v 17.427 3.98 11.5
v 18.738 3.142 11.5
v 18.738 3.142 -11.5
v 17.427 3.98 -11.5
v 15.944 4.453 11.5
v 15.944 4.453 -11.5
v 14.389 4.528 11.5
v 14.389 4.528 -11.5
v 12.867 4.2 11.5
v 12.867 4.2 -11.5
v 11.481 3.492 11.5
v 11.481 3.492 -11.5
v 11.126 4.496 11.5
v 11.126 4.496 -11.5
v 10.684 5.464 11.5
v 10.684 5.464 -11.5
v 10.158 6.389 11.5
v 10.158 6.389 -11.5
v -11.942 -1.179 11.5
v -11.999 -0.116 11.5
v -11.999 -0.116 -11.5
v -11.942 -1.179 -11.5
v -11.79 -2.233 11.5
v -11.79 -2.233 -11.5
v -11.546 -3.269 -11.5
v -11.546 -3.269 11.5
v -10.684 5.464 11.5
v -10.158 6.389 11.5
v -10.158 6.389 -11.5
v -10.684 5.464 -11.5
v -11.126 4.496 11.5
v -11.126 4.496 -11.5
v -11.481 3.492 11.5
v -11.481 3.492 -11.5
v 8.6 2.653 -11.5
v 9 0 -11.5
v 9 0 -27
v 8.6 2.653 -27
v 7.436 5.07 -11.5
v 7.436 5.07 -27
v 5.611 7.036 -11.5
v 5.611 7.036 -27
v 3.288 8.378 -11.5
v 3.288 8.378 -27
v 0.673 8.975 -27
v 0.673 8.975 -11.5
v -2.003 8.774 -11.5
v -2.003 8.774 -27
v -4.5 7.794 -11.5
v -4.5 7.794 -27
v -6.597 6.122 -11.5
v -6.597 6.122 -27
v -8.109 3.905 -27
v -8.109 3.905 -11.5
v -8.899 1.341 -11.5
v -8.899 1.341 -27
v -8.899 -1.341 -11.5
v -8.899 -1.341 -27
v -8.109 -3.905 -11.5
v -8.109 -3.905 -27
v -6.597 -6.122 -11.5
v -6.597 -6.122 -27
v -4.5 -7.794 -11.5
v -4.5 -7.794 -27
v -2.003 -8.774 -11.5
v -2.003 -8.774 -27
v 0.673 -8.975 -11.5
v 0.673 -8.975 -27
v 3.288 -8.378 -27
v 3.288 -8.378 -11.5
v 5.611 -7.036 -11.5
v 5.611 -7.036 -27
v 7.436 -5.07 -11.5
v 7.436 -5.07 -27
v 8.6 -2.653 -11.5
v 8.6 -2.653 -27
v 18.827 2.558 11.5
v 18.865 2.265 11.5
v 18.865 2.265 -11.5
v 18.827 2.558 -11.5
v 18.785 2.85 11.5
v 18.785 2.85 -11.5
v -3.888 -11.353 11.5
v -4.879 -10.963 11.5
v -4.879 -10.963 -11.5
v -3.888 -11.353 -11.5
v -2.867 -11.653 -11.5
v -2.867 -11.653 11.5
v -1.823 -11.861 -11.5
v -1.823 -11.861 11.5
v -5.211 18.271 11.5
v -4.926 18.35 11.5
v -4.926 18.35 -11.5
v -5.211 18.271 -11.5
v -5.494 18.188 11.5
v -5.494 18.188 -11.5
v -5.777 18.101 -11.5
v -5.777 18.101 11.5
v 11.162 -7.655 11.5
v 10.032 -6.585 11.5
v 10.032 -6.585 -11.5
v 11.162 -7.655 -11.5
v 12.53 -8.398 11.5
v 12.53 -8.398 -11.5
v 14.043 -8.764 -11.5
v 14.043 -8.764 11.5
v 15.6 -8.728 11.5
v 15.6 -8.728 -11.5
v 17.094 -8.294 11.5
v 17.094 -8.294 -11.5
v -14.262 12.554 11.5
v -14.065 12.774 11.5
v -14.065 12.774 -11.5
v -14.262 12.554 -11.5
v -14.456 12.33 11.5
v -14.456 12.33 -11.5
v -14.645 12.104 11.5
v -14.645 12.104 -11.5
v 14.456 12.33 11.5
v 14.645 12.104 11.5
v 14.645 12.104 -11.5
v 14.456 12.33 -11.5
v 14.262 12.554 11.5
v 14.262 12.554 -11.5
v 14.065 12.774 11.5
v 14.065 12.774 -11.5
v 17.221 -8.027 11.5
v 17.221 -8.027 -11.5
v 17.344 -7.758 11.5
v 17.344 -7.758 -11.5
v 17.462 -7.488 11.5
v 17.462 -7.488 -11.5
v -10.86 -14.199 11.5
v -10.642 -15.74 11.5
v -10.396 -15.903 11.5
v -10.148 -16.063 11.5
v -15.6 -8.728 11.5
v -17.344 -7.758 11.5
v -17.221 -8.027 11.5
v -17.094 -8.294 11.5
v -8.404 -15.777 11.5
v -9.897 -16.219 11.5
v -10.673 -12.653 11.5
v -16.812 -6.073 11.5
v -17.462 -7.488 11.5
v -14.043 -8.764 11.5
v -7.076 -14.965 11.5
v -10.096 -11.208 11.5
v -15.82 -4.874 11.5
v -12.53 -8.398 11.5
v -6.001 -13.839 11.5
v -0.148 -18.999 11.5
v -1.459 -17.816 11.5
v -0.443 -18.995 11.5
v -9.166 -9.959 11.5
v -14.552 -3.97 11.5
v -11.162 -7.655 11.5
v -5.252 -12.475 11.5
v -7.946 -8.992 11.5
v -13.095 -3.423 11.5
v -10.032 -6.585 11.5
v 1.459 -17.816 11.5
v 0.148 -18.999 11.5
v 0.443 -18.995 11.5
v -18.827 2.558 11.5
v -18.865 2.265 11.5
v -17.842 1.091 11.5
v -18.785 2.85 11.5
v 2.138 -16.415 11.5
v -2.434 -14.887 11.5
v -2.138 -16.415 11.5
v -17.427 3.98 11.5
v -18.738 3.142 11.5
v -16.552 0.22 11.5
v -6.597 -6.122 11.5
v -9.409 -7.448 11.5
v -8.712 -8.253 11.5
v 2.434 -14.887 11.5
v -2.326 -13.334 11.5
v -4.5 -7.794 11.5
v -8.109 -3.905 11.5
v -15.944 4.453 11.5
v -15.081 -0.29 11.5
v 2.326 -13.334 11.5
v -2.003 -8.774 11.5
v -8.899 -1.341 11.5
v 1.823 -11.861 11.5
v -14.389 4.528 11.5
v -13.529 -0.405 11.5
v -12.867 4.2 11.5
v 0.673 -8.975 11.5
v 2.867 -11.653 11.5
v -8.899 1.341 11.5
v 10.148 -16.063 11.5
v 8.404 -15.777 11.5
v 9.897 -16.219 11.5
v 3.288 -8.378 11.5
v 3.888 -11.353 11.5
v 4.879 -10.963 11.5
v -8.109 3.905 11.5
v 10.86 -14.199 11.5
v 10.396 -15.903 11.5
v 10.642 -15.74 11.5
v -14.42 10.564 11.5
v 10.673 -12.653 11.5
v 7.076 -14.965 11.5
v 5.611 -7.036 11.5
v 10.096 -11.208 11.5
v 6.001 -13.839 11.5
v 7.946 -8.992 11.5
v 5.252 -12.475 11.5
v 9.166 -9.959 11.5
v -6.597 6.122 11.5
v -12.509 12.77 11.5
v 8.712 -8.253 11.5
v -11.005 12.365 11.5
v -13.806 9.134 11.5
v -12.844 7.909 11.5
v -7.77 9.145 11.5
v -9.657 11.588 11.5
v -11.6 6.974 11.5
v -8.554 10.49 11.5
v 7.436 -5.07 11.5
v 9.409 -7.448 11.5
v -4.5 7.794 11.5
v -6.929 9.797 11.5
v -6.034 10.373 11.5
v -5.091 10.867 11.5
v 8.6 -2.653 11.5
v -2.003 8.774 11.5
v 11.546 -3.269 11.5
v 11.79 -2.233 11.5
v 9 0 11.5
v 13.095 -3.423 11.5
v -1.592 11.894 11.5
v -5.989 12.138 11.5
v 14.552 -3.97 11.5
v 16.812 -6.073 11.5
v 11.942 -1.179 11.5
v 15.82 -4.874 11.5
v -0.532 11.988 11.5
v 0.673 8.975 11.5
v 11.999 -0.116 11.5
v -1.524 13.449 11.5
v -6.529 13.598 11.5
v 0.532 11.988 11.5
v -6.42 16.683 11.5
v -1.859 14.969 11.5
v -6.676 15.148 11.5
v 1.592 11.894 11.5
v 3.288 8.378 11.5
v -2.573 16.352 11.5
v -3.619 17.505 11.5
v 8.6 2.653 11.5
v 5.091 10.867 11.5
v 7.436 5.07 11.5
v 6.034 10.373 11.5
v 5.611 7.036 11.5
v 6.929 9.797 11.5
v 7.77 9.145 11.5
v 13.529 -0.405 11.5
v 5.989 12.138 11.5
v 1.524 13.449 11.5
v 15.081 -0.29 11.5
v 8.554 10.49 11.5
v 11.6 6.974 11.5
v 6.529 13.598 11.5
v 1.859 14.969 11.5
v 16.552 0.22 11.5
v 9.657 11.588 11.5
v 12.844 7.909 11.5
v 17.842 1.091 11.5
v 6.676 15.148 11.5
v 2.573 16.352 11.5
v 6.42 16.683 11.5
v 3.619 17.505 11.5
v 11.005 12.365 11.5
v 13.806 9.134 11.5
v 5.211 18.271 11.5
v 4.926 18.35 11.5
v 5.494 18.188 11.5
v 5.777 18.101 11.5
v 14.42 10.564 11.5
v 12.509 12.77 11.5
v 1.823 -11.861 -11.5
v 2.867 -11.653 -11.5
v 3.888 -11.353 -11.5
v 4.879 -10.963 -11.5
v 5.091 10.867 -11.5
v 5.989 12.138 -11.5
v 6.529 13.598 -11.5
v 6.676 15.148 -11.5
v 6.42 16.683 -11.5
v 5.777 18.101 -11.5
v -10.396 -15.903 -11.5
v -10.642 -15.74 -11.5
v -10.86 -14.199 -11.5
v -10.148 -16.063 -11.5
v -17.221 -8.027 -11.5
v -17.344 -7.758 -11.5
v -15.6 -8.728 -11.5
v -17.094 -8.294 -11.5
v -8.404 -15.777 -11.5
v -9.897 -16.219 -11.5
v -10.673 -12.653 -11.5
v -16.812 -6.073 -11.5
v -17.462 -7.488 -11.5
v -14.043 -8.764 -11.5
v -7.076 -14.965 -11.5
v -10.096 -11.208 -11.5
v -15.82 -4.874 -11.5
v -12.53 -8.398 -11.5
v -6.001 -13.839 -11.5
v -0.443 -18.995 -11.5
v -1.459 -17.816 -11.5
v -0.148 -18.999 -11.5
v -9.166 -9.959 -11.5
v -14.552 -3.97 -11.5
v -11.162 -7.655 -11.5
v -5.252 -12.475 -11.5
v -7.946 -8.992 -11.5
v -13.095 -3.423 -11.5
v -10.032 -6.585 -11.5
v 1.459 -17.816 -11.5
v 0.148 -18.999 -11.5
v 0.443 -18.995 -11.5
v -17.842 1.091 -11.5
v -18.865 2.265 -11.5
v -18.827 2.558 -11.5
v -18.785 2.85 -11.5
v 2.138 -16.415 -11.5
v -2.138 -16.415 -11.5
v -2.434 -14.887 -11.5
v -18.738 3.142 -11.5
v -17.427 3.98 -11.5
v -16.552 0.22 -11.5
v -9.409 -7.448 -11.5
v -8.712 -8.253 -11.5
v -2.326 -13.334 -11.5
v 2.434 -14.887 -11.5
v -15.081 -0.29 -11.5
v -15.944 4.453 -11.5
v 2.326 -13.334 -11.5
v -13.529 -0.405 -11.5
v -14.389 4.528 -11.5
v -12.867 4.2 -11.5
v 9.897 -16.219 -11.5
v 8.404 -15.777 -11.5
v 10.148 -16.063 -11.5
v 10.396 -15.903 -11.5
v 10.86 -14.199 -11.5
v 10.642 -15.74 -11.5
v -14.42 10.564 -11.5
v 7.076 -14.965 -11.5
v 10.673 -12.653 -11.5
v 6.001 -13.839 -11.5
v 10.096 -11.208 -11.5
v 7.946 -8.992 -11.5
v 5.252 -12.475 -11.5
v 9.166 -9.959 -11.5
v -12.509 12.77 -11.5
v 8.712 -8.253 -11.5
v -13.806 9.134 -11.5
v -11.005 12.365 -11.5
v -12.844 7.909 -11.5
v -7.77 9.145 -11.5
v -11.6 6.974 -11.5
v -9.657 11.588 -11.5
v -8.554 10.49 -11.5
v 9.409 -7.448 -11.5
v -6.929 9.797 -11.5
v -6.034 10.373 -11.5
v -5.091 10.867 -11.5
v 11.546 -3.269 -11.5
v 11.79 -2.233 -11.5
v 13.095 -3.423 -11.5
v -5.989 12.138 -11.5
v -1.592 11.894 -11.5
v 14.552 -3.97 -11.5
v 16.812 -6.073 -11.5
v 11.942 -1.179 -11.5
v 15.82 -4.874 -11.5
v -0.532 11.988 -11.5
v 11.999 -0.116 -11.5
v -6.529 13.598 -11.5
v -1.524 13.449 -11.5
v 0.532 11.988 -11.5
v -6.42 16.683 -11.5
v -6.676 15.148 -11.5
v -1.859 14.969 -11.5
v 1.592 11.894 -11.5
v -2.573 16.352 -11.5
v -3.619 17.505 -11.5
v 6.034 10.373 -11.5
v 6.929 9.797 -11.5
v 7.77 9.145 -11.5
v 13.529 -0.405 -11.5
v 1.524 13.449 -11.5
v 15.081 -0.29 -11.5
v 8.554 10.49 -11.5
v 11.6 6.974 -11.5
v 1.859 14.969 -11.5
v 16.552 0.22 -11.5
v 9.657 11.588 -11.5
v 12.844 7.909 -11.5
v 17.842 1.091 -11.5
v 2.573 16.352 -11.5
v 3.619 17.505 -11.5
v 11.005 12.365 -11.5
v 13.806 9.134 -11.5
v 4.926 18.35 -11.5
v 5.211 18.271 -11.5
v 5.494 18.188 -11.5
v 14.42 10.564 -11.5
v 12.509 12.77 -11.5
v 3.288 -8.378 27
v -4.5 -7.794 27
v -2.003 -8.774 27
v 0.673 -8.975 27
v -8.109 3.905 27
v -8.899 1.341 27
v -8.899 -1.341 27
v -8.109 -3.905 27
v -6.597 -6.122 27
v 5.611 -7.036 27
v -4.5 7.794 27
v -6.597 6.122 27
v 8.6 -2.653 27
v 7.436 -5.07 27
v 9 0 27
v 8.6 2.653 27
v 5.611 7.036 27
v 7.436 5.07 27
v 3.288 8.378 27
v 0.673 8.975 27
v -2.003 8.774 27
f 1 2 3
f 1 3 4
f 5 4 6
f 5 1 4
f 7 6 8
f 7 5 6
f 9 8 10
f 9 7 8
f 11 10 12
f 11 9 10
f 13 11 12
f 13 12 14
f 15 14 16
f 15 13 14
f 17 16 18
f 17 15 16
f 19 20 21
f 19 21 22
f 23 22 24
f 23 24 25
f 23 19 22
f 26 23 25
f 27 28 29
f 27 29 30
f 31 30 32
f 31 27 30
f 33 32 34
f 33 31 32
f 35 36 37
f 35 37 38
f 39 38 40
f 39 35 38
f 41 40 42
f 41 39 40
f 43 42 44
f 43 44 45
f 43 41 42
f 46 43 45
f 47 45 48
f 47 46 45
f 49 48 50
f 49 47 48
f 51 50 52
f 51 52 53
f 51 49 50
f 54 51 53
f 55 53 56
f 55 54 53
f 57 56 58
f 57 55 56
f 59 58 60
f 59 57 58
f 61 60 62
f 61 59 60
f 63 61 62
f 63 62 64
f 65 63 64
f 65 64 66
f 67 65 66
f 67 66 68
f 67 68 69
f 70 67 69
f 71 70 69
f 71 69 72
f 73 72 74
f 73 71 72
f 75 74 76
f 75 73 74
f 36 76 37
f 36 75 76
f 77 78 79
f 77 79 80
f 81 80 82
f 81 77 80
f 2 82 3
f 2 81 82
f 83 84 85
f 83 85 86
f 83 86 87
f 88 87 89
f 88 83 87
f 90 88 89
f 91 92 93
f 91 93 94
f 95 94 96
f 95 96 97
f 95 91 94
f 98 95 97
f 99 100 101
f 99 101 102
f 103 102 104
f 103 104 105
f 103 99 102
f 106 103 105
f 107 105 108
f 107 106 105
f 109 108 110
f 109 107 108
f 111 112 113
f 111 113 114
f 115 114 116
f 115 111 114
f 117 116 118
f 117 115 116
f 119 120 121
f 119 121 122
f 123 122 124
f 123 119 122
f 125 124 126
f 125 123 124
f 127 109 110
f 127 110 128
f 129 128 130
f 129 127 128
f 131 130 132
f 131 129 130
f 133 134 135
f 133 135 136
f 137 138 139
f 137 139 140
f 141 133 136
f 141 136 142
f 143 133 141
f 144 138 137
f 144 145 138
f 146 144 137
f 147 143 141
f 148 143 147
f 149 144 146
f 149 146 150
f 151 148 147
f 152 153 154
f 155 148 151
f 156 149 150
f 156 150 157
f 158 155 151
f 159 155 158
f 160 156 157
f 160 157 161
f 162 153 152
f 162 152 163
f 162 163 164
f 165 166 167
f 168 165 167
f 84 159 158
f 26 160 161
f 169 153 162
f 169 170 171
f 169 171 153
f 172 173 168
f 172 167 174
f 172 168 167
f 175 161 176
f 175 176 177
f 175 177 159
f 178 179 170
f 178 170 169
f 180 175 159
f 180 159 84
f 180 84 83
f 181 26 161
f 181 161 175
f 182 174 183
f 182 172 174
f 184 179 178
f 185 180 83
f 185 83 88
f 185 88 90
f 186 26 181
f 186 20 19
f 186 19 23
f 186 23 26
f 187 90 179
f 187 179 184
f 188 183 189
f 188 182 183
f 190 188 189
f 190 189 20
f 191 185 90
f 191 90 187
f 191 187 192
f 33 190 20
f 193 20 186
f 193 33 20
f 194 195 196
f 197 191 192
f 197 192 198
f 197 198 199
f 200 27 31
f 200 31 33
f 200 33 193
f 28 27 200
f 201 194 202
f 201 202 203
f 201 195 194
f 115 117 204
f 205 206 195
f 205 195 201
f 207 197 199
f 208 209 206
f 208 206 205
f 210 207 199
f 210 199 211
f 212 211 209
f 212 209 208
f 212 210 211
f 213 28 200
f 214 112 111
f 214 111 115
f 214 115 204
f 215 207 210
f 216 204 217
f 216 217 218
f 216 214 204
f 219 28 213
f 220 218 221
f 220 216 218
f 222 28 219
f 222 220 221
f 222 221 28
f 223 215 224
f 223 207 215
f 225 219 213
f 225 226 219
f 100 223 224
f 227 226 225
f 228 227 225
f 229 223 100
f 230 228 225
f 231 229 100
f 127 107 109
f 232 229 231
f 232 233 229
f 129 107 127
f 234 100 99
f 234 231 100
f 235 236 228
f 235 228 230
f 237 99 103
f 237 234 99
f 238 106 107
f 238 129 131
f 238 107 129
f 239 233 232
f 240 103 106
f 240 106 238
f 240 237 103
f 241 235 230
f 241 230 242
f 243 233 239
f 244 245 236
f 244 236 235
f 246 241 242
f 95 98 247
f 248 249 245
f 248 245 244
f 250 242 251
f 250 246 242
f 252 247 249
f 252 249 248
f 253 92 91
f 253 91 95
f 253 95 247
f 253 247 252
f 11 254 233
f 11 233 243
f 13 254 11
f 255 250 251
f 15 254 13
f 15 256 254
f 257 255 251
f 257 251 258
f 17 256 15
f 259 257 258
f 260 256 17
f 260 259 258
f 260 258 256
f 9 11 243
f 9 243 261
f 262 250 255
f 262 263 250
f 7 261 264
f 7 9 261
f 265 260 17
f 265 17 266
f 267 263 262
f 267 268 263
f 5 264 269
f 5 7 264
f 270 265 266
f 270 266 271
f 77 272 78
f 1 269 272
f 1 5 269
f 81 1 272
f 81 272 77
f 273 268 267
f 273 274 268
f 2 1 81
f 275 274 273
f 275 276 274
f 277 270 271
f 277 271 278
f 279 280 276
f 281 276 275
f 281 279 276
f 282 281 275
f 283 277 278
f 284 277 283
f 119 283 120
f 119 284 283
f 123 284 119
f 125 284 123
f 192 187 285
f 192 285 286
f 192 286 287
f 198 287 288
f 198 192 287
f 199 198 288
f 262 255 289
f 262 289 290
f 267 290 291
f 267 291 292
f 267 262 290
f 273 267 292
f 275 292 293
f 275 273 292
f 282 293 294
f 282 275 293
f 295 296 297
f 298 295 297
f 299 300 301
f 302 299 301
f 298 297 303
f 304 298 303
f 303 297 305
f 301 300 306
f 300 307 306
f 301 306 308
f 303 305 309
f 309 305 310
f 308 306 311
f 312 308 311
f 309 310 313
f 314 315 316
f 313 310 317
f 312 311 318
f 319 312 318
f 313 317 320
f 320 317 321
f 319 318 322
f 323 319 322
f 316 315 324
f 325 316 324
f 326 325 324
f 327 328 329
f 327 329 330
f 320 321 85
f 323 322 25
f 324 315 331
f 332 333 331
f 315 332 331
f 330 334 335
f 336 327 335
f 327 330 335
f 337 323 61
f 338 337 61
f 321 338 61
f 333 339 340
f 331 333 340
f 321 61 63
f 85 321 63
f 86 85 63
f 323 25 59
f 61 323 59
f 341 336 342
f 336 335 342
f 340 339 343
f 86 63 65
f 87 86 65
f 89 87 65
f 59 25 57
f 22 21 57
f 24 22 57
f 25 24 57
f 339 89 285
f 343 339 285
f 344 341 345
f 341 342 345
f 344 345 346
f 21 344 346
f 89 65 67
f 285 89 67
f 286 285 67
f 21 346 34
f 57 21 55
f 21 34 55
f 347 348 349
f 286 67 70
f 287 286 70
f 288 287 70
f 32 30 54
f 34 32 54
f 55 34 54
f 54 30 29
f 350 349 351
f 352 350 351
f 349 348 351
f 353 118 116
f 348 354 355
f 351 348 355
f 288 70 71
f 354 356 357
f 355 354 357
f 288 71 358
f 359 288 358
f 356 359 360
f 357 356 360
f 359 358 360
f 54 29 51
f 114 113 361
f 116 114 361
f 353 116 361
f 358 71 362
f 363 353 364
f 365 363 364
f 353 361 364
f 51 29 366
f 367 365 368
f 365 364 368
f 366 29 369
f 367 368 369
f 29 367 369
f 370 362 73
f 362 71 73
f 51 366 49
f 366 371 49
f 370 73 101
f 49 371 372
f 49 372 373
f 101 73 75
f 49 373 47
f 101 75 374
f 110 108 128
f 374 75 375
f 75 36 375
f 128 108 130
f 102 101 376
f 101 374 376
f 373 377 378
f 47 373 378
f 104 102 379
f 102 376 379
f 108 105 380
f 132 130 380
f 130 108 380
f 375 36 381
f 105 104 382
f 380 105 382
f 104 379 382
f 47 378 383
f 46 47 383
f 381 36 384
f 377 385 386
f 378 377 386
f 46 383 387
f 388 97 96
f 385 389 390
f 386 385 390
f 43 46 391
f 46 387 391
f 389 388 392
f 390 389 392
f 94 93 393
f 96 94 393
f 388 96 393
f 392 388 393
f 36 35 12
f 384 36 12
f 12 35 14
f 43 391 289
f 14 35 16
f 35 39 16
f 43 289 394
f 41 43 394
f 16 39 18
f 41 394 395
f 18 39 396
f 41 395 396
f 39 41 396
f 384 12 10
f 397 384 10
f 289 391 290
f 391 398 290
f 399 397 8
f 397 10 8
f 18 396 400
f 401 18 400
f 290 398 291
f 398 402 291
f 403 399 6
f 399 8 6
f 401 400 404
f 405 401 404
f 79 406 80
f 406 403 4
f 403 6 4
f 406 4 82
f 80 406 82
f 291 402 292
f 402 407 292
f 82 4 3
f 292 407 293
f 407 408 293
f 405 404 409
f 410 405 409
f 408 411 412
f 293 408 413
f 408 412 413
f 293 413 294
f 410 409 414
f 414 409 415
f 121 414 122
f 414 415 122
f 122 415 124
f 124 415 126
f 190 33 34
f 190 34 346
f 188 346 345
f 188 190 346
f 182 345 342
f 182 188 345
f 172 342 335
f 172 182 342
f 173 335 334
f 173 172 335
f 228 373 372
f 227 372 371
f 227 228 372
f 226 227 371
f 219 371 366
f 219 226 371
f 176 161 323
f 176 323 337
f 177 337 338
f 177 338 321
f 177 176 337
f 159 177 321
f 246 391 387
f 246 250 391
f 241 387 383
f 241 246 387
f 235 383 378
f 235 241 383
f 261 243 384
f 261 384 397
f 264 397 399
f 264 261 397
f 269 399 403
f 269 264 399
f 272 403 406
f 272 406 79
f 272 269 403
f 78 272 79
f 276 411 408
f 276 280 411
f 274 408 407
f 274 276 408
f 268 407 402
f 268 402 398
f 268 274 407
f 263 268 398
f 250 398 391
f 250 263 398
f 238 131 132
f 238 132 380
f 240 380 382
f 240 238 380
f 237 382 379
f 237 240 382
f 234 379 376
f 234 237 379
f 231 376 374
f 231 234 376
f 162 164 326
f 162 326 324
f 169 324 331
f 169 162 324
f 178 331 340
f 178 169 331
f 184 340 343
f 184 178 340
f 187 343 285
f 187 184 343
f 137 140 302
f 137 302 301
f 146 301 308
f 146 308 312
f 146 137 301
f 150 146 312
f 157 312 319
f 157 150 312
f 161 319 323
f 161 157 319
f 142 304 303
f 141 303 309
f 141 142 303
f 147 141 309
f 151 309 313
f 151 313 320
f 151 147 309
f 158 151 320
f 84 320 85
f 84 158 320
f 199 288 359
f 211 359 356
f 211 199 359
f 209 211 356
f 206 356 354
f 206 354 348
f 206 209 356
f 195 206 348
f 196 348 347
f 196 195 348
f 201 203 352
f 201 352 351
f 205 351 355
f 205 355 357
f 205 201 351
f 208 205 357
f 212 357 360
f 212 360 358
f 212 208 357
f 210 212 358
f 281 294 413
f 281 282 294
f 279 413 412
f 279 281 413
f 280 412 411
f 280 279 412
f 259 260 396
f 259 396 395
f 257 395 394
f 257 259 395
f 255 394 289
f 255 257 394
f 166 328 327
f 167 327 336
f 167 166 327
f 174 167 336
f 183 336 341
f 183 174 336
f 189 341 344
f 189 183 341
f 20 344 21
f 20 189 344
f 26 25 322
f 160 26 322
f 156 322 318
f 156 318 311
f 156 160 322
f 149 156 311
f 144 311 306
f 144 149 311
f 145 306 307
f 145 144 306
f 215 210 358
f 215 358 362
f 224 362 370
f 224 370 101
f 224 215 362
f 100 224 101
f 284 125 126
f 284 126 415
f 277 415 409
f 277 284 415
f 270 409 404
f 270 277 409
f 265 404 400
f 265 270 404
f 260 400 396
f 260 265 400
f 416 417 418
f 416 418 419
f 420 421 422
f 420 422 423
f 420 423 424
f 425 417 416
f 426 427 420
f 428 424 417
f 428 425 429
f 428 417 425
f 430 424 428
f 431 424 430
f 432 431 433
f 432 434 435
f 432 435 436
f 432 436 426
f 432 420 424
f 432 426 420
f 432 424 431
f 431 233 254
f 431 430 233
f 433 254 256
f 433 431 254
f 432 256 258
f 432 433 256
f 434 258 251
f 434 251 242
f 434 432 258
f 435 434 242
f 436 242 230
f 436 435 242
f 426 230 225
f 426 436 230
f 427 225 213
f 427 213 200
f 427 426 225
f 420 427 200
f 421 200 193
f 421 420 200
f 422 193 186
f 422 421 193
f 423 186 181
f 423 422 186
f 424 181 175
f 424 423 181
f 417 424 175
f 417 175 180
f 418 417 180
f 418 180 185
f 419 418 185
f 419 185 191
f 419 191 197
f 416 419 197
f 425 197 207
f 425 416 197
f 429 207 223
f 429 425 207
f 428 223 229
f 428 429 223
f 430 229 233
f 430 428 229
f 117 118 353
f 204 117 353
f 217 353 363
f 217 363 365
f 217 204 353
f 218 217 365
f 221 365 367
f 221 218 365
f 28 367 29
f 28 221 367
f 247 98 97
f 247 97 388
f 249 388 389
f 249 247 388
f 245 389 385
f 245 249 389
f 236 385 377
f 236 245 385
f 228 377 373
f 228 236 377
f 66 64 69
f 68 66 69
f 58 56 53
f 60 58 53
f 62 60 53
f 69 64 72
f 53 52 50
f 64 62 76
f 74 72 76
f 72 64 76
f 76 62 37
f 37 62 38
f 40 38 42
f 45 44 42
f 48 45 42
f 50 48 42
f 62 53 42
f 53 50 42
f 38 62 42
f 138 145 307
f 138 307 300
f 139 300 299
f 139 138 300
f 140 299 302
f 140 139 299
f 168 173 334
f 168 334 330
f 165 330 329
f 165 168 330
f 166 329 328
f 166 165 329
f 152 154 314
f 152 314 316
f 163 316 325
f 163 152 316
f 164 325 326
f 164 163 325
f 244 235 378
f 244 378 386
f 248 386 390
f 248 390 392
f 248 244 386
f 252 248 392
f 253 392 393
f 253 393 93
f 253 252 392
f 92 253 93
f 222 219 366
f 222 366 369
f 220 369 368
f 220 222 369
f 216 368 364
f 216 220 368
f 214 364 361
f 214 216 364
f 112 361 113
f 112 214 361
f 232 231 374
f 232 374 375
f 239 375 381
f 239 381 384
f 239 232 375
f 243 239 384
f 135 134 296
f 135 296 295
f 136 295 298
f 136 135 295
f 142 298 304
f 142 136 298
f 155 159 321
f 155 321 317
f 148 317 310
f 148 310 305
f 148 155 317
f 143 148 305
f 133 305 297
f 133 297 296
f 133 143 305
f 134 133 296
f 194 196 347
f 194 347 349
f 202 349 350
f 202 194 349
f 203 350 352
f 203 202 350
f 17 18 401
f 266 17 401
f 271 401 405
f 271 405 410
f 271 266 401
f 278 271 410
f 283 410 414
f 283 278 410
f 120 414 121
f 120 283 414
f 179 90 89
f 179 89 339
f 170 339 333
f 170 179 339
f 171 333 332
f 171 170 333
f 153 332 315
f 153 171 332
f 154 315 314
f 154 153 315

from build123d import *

# Parameters (mm, degrees)
SKETCH1_R           = 9
BOSS_EXTRUDE1_DEPTH = 27
BOSS_EXTRUDE2_DEPTH = 11.5


with BuildPart() as part:
    # Sketch1 → Boss-Extrude1 (new body, symmetric)
    with BuildSketch(Plane.XY):
        Circle(SKETCH1_R)
    extrude(amount=BOSS_EXTRUDE1_DEPTH, both=True)

    # Sketch2 → Boss-Extrude2 (add, symmetric)
    with BuildSketch(Plane.XY):
        with BuildLine():
            ThreePointArc((1.592403849, 11.893874473), (0, 12), (-1.592403849, 11.893874473))
            ThreePointArc((-1.592403849, 11.893874473), (-2.170910027, 15.684139908), (-4.926417678, 18.350215499))
            ThreePointArc((-4.926417678, 18.350215499), (-5.35291858, 18.230366499), (-5.776509232, 18.100606097))
            ThreePointArc((-5.776509232, 18.100606097), (-6.653200491, 14.368020679), (-5.090698654, 10.866682438))
            ThreePointArc((-5.090698654, 10.866682438), (-6.487689809, 10.095042394), (-7.769929381, 9.144845401))
            ThreePointArc((-7.769929381, 9.144845401), (-10.305771951, 12.020655535), (-14.065241784, 12.773761136))
            ThreePointArc((-14.065241784, 12.773761136), (-14.359241913, 12.442353945), (-14.645435276, 12.104182152))
            ThreePointArc((-14.645435276, 12.104182152), (-13.364966863, 8.490156404), (-10.157540304, 6.389395509))
            ThreePointArc((-10.157540304, 6.389395509), (-10.915583944, 4.984980156), (-11.480557235, 3.492392528))
            ThreePointArc((-11.480557235, 3.492392528), (-15.168624097, 4.540697964), (-18.738451003, 3.141727868))
            ThreePointArc((-18.738451003, 3.141727868), (-18.806607396, 2.703981927), (-18.864539099, 2.264765898))
            ThreePointArc((-18.864539099, 2.264765898), (-15.833450688, -0.083272541), (-11.999434677, -0.116479348))
            ThreePointArc((-11.999434677, -0.116479348), (-11.877857303, -1.707778059), (-11.546189284, -3.268870296))
            ThreePointArc((-11.546189284, -3.268870296), (-15.215545269, -4.380899128), (-17.462334429, -7.4877818))
            ThreePointArc((-17.462334429, -7.4877818), (-17.283007912, -7.892885247), (-17.094285049, -8.293697527))
            ThreePointArc((-17.094285049, -8.293697527), (-13.274925794, -8.630263043), (-10.031593324, -6.585372836))
            ThreePointArc((-10.031593324, -6.585372836), (-9.068994892, -7.858328807), (-7.945987817, -8.992289898))
            ThreePointArc((-7.945987817, -8.992289898), (-10.431638326, -11.911591701), (-10.642050057, -15.739973653))
            ThreePointArc((-10.642050057, -15.739973653), (-10.272175532, -15.983817124), (-9.896716278, -16.218970587))
            ThreePointArc((-9.896716278, -16.218970587), (-6.501705756, -14.437206007), (-4.87879197, -10.963456978))
            ThreePointArc((-4.87879197, -10.963456978), (-3.380790682, -11.513915683), (-1.822991362, -11.860720994))
            ThreePointArc((-1.822991362, -11.860720994), (-2.335759921, -15.660438072), (-0.442989984, -18.994835084))
            ThreePointArc((-0.442989984, -18.994835084), (0, -19), (0.442989984, -18.994835084))
            ThreePointArc((0.442989984, -18.994835084), (2.335759921, -15.660438072), (1.822991362, -11.860720994))
            ThreePointArc((1.822991362, -11.860720994), (3.380790682, -11.513915683), (4.87879197, -10.963456978))
            ThreePointArc((4.87879197, -10.963456978), (6.501705756, -14.437206007), (9.896716278, -16.218970587))
            ThreePointArc((9.896716278, -16.218970587), (10.272175532, -15.983817124), (10.642050057, -15.739973653))
            ThreePointArc((10.642050057, -15.739973653), (10.431638326, -11.911591701), (7.945987817, -8.992289898))
            ThreePointArc((7.945987817, -8.992289898), (9.068994892, -7.858328807), (10.031593324, -6.585372836))
            ThreePointArc((10.031593324, -6.585372836), (13.274925794, -8.630263043), (17.094285049, -8.293697527))
            ThreePointArc((17.094285049, -8.293697527), (17.283007912, -7.892885247), (17.462334429, -7.4877818))
            ThreePointArc((17.462334429, -7.4877818), (15.215545269, -4.380899128), (11.546189284, -3.268870296))
            ThreePointArc((11.546189284, -3.268870296), (11.877857303, -1.707778059), (11.999434677, -0.116479348))
            ThreePointArc((11.999434677, -0.116479348), (15.833450688, -0.083272541), (18.864539099, 2.264765898))
            ThreePointArc((18.864539099, 2.264765898), (18.806607396, 2.703981927), (18.738451003, 3.141727868))
            ThreePointArc((18.738451003, 3.141727868), (15.168624097, 4.540697964), (11.480557235, 3.492392528))
            ThreePointArc((11.480557235, 3.492392528), (10.915583944, 4.984980156), (10.157540304, 6.389395509))
            ThreePointArc((10.157540304, 6.389395509), (13.364966863, 8.490156404), (14.645435276, 12.104182152))
            ThreePointArc((14.645435276, 12.104182152), (14.359241913, 12.442353945), (14.065241784, 12.773761136))
            ThreePointArc((14.065241784, 12.773761136), (10.305771951, 12.020655535), (7.769929381, 9.144845401))
            ThreePointArc((7.769929381, 9.144845401), (6.487689809, 10.095042394), (5.090698654, 10.866682438))
            ThreePointArc((5.090698654, 10.866682438), (6.653200491, 14.368020679), (5.776509232, 18.100606097))
            ThreePointArc((5.776509232, 18.100606097), (5.35291858, 18.230366499), (4.926417678, 18.350215499))
            ThreePointArc((4.926417678, 18.350215499), (2.170910027, 15.684139908), (1.592403849, 11.893874473))
        make_face()
    extrude(amount=BOSS_EXTRUDE2_DEPTH, both=True)


solid = part.part
